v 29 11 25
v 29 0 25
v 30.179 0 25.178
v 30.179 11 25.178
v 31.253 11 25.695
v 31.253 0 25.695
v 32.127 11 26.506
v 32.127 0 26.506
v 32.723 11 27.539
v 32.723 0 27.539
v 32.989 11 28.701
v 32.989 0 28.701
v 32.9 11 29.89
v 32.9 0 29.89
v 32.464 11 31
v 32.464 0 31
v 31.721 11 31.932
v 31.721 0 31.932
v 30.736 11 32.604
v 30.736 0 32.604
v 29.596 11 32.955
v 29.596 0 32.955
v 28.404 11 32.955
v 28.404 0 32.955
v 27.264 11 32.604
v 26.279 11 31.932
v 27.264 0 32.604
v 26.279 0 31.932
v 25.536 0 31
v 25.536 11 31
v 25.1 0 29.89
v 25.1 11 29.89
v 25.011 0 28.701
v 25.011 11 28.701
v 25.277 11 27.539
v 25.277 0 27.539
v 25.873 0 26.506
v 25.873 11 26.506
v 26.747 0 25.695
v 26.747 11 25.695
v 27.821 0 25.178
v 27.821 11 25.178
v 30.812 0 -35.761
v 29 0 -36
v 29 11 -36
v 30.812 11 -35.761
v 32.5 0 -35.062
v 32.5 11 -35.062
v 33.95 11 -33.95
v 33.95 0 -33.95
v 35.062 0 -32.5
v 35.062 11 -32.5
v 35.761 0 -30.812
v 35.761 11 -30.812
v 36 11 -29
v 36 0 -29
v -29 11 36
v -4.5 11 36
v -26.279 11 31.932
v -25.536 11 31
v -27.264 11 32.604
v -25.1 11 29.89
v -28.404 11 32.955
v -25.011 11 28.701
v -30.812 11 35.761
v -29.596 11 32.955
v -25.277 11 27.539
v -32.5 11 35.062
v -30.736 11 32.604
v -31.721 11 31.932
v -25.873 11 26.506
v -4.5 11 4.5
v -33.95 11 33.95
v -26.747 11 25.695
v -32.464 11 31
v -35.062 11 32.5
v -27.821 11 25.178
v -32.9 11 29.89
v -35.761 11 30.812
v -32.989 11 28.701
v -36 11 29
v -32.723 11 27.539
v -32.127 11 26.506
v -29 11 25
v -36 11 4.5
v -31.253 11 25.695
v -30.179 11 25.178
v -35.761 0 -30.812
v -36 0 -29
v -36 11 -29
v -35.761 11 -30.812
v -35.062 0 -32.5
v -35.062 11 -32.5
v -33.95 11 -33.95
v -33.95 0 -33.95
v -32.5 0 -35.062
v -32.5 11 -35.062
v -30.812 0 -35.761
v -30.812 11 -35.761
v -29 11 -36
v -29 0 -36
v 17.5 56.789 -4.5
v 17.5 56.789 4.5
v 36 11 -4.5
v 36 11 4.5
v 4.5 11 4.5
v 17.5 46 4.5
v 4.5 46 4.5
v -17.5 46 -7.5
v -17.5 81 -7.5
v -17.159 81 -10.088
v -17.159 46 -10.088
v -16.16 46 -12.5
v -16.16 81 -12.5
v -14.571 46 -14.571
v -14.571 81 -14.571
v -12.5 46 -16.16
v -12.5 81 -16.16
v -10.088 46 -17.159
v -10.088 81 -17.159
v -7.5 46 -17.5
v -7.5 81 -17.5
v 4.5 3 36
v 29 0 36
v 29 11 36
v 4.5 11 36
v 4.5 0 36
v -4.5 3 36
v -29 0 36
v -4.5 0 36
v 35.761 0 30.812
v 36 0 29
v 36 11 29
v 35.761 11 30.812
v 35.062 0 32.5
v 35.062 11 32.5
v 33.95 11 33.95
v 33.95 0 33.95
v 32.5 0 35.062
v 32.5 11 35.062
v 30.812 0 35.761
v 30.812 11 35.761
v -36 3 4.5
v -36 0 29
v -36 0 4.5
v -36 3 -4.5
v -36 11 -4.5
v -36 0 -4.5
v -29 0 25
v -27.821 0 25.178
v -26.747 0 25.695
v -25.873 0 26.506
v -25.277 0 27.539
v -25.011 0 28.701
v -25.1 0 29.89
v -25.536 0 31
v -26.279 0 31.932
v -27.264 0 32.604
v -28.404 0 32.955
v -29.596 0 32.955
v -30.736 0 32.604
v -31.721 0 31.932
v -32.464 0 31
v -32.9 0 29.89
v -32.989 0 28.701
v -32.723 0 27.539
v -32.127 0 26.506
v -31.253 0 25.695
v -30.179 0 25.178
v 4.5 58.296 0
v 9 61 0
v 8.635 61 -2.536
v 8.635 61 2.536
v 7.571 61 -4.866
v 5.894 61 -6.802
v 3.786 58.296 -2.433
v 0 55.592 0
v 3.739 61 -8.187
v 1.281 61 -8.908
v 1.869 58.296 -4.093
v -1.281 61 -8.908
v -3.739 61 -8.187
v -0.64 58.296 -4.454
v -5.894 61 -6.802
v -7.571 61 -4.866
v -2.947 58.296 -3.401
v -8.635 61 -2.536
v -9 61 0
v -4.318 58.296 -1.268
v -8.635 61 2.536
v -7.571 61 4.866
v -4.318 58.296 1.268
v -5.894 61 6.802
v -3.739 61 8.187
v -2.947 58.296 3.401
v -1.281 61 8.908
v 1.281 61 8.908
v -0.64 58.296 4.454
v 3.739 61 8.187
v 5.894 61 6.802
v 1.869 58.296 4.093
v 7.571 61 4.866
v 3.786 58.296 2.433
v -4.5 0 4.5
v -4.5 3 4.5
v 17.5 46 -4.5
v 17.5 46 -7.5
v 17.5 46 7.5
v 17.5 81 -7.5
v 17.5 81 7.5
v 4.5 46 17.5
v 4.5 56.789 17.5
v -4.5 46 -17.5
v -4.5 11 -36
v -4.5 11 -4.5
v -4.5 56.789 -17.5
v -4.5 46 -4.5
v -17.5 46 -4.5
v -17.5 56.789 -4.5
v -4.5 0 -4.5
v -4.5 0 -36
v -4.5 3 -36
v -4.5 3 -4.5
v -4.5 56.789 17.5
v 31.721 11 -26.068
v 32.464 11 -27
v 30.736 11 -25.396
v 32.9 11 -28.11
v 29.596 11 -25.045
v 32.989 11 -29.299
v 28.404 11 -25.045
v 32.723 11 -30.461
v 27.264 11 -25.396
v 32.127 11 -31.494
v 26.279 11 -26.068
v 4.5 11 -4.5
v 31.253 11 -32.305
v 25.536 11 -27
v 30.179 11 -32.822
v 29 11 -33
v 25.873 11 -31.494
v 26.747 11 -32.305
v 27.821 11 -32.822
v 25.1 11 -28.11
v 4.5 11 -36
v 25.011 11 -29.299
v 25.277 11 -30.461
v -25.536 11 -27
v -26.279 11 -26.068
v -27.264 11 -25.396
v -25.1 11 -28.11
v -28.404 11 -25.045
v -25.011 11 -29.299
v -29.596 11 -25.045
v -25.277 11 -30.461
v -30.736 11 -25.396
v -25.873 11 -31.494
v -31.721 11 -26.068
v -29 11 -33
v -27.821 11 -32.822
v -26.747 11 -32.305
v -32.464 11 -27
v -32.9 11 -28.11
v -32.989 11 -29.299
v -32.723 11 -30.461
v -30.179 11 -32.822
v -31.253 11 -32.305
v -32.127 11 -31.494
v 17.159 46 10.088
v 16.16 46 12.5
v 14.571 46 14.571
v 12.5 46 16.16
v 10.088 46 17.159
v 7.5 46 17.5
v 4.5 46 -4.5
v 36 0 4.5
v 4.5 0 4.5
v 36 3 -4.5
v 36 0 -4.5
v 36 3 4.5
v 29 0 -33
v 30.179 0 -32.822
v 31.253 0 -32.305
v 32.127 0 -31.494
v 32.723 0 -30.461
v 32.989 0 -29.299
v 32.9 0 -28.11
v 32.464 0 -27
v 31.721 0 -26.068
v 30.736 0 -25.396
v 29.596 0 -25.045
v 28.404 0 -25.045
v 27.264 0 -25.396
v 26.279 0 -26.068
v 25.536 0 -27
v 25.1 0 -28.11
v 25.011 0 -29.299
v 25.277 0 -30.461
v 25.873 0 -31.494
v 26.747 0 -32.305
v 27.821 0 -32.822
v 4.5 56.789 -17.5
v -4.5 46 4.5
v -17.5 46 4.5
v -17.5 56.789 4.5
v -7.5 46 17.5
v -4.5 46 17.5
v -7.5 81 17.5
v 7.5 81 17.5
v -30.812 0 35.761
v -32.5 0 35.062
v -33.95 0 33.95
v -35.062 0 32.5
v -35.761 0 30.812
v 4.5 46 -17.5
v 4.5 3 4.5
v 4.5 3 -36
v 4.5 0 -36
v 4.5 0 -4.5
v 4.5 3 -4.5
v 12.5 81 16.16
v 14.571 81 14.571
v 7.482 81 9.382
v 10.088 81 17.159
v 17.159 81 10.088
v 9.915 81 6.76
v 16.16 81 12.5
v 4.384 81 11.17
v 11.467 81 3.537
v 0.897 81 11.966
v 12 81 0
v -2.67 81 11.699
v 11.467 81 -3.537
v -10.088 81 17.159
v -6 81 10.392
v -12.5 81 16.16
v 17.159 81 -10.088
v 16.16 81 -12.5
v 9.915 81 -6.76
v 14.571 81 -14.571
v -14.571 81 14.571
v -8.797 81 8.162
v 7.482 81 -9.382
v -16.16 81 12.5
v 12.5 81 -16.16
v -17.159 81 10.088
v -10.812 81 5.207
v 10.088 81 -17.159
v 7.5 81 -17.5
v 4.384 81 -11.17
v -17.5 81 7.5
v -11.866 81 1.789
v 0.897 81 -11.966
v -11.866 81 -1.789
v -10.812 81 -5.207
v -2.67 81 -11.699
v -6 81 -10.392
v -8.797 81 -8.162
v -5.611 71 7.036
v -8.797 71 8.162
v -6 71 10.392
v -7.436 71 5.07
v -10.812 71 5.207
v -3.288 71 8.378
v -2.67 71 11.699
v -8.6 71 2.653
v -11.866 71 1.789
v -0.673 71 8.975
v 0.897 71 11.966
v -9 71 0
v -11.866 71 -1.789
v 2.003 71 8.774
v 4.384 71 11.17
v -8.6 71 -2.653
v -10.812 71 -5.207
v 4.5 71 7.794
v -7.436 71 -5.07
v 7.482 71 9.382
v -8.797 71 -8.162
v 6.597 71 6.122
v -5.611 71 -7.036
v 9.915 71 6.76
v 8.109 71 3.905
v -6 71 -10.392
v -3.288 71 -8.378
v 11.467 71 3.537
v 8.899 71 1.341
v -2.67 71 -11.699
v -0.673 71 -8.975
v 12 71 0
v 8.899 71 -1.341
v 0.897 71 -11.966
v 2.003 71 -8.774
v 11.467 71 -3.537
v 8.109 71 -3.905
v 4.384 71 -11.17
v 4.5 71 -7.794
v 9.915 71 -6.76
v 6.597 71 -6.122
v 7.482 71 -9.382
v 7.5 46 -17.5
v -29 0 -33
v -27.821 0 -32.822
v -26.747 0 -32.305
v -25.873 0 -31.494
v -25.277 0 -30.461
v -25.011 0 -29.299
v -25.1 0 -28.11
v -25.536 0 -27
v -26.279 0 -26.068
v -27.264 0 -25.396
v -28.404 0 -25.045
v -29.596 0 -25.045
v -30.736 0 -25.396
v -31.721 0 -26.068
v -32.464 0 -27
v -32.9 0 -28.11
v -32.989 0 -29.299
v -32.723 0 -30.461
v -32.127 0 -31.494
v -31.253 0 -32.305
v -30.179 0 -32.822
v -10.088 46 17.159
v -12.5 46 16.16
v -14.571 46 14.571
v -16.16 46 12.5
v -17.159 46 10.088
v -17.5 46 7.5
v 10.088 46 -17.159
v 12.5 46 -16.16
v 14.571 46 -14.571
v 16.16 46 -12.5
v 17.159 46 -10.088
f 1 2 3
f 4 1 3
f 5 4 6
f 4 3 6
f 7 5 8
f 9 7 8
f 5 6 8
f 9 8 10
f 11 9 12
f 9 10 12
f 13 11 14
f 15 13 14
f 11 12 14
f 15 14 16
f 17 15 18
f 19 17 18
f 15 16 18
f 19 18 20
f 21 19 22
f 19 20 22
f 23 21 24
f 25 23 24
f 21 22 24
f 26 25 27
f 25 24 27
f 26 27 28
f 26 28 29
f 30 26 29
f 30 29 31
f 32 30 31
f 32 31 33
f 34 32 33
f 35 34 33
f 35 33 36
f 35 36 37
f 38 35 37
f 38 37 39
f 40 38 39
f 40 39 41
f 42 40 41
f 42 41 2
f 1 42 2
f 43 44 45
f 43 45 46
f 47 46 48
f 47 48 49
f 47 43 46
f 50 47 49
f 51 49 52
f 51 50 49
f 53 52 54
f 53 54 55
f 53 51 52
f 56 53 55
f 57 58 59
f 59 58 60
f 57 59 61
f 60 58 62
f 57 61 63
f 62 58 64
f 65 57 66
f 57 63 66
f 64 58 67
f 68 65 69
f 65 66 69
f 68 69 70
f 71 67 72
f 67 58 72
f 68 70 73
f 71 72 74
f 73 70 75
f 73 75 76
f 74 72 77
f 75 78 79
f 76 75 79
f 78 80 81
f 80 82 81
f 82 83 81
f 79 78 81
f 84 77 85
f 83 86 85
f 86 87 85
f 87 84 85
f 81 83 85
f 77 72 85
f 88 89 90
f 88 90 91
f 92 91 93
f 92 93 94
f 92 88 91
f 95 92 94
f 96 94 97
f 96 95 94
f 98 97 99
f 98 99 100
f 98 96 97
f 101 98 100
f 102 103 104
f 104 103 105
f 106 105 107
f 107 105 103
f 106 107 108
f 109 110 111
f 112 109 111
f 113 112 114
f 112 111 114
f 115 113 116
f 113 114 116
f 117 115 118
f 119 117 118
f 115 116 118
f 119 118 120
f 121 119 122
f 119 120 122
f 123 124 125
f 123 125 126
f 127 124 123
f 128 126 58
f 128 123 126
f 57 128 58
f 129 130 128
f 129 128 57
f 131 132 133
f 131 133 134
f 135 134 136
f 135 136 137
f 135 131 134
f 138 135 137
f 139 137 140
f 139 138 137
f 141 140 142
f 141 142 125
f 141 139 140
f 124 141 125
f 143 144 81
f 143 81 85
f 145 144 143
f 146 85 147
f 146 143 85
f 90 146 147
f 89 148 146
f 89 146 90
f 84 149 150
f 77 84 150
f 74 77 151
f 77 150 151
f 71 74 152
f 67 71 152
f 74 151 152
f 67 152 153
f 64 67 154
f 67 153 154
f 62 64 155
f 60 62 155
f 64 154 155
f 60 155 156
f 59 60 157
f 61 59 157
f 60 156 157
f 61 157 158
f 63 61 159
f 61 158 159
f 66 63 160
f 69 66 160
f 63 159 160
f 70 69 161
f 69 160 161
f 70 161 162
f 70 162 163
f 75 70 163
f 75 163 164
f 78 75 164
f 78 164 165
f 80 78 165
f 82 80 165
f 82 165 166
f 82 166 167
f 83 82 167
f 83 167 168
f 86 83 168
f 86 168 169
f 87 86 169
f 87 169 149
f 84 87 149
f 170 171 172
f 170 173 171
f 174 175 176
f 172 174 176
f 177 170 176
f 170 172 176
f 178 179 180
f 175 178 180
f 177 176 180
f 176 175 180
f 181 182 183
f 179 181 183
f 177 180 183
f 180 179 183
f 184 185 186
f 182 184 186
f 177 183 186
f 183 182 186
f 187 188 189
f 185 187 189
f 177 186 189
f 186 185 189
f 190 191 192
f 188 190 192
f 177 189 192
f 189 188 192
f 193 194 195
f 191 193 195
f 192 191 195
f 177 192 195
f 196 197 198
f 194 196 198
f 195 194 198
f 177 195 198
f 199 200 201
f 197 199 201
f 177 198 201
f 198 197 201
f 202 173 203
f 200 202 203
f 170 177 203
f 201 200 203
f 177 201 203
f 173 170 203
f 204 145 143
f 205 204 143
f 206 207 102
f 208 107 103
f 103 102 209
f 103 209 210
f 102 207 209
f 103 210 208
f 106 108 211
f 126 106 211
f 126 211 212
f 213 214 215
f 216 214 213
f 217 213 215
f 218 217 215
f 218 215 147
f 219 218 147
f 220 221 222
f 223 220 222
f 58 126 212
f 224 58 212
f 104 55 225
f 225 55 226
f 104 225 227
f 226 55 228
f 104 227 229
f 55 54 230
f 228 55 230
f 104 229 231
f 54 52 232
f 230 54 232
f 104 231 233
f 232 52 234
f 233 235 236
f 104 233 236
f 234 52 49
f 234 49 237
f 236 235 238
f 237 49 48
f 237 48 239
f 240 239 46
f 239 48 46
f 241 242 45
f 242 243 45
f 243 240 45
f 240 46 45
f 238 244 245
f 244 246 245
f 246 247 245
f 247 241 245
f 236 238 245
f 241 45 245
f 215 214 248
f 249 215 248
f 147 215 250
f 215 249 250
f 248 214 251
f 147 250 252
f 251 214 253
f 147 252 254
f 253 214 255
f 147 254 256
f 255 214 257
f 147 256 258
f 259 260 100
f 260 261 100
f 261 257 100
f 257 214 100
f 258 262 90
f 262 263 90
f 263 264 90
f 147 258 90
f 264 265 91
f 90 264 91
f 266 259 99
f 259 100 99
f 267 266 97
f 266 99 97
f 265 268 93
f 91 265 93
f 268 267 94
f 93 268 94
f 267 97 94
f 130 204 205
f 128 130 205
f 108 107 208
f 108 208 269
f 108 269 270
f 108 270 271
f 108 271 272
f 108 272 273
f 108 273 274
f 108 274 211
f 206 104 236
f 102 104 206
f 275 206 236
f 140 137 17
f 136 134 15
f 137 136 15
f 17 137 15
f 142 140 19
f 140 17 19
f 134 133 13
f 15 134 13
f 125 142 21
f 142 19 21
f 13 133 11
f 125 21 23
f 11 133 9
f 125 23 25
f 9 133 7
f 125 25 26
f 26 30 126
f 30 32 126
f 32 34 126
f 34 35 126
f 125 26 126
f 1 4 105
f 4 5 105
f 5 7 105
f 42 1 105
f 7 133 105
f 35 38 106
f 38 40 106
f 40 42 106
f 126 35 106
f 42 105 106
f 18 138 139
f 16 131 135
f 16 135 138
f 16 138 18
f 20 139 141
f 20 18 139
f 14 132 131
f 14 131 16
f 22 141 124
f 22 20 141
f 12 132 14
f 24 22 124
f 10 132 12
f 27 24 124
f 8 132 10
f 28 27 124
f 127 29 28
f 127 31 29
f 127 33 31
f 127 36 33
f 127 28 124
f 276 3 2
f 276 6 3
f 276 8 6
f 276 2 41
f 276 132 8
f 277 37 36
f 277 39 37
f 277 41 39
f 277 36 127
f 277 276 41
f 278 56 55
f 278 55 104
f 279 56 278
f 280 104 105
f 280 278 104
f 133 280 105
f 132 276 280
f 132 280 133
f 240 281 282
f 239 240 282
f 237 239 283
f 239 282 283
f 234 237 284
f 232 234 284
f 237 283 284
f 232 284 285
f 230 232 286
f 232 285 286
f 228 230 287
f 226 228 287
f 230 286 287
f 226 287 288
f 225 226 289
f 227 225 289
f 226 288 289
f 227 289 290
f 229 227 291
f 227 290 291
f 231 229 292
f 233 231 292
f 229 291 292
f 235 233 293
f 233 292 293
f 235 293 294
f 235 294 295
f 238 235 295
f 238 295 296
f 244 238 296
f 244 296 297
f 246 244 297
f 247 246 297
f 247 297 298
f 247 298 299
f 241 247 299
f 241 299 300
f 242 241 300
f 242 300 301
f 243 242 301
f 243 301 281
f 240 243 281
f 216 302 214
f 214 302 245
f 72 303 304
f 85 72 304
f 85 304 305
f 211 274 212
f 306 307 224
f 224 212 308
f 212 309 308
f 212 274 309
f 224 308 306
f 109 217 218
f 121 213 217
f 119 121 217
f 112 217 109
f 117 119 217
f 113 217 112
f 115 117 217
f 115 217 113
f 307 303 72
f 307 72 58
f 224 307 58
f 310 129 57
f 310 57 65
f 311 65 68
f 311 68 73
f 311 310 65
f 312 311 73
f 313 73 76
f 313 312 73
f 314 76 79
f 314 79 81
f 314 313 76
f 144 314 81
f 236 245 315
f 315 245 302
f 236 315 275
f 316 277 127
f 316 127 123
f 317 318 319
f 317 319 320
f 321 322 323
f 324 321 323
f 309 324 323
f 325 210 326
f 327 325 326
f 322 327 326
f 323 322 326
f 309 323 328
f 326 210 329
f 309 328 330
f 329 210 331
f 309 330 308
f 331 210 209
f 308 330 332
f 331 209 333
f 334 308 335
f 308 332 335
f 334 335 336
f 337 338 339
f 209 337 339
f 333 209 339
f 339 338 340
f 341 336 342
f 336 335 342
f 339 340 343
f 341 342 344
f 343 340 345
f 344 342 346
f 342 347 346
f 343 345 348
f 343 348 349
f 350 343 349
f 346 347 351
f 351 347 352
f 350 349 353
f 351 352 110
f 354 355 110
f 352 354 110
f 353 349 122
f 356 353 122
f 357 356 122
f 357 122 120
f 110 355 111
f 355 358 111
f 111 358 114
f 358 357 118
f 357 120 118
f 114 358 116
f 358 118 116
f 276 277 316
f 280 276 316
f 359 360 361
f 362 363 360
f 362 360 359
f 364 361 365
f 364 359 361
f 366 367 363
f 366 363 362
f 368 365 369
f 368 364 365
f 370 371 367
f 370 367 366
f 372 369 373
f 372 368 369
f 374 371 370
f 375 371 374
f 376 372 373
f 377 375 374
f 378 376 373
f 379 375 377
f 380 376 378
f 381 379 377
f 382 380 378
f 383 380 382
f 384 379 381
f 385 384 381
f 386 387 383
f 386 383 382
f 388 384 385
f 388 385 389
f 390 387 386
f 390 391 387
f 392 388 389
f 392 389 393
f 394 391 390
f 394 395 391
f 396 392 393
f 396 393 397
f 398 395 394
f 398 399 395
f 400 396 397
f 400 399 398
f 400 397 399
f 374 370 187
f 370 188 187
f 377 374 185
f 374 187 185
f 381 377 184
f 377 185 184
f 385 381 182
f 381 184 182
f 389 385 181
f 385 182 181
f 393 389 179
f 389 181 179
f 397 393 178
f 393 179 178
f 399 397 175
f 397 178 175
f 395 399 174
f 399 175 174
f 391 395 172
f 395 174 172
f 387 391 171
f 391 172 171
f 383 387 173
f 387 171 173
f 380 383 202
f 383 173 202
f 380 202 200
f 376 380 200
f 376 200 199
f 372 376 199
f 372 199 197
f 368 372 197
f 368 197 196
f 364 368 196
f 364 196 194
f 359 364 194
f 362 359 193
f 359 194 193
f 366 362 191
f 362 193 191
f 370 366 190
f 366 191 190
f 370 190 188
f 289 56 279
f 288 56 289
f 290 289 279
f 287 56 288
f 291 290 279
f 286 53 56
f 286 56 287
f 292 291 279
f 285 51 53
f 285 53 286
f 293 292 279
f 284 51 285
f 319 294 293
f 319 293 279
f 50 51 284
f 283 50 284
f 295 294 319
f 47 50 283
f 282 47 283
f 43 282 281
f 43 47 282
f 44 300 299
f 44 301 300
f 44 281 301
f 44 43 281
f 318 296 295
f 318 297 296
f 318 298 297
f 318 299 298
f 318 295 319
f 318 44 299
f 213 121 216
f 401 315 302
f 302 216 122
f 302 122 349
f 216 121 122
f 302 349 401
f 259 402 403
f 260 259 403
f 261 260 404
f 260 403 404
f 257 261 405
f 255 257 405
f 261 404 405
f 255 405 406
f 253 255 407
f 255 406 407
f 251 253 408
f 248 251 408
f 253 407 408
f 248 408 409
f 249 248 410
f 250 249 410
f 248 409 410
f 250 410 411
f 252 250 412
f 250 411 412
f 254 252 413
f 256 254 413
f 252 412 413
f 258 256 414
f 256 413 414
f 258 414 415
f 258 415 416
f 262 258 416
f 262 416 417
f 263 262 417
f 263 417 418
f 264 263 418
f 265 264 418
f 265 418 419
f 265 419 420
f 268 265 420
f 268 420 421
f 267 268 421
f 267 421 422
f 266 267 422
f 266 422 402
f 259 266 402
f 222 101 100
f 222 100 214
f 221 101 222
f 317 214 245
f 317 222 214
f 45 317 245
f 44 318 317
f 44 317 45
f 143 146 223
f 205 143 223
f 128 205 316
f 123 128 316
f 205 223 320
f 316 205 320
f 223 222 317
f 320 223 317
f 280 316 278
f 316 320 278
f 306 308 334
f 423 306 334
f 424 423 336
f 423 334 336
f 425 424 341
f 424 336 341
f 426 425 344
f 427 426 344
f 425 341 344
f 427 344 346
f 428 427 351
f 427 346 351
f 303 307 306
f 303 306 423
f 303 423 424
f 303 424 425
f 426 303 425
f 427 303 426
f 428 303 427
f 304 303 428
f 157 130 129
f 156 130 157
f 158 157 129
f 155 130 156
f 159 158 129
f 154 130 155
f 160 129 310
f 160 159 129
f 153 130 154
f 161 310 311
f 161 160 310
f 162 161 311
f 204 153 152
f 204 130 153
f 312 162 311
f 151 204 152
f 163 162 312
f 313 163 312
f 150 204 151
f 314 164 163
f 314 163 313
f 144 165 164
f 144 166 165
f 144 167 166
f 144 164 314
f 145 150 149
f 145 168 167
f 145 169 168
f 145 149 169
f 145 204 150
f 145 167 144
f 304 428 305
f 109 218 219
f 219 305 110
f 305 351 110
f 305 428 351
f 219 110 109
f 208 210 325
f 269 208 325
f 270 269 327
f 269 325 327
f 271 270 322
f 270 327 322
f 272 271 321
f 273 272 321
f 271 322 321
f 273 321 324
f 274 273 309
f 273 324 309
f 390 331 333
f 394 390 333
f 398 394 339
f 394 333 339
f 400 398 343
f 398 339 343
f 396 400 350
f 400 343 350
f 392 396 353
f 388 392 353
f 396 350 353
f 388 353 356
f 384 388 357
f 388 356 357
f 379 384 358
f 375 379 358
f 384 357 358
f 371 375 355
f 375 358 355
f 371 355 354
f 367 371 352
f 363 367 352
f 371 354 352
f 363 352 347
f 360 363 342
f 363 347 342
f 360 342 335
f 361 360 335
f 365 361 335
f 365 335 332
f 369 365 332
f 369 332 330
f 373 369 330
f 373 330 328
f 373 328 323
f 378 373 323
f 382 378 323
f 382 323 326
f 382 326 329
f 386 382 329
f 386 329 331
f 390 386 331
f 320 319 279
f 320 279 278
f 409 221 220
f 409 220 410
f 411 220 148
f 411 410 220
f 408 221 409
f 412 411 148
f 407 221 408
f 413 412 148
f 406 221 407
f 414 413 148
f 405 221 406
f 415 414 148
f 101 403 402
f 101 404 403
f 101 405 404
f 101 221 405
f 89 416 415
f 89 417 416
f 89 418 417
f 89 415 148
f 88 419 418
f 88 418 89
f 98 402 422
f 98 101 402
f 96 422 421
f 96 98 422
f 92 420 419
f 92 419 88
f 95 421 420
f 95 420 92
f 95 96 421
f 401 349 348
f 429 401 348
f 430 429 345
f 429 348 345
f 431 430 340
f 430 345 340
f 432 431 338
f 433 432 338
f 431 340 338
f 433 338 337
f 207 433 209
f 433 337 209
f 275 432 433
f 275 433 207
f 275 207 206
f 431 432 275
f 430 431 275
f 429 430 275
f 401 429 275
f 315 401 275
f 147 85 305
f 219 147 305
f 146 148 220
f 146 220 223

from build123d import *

# Parameters (mm, degrees)
EXTRUDE_1_DEPTH              = 11
EXTRUDE_2_DEPTH              = 4.5
EXTRUDE_3_DEPTH              = 4.5
EXTRUDE_4_DEPTH              = 35
HOLE_WIZARD_M4_1_D           = 18
HOLE_WIZARD_M4_1_DEPTH       = 20
HOLE_WIZARD_M4_1_CBORE_D     = 24
HOLE_WIZARD_M4_1_CBORE_DEPTH = 10
HOLE_WIZARD_M4_1_TIP         = 5.407745571
SKETCH_14_R                  = 4
CUT_EXTRUDE_1_DEPTH          = 15
CUT_EXTRUDE_2_DEPTH          = 96.671312315
CUT_EXTRUDE_2_DEPTH_BACK     = 96.671312315
SKETCH_15_W                  = 9
SKETCH_15_H                  = 3
CUT_EXTRUDE_3_DEPTH          = 96.671312315
CUT_EXTRUDE_3_DEPTH_BACK     = 96.671312315
SKETCH_16_W                  = 9
SKETCH_16_H                  = 3


with BuildPart() as part:
    # 스케치1 → 보스-돌출1 (new body)
    with BuildSketch(Plane(origin=(0, 0, 0), x_dir=(1, 0, 0), z_dir=(0, 1, 0))):
        with BuildLine():
            Line((-29, 36), (29, 36))
            ThreePointArc((29, 36), (33.949747468, 33.949747468), (36, 29))
            Line((36, 29), (36, -29))
            ThreePointArc((36, -29), (33.949747468, -33.949747468), (29, -36))
            Line((29, -36), (-29, -36))
            ThreePointArc((-29, -36), (-33.949747468, -33.949747468), (-36, -29))
            Line((-36, -29), (-36, 29))
            ThreePointArc((-36, 29), (-33.949747468, 33.949747468), (-29, 36))
        make_face()
    extrude(amount=EXTRUDE_1_DEPTH)

    # 스케치2 → 보스-돌출2 (add, symmetric)
    with BuildSketch(Plane.XY):
        Polygon((-36, 11), (-13.651164073, 66.315309992), (13.651164073, 66.315309992), (36, 11), align=None)
    extrude(amount=EXTRUDE_2_DEPTH, both=True)

    # 스케치3 → 보스-돌출3 (add, symmetric)
    with BuildSketch(Plane(origin=(0, 0, 0), x_dir=(0, 0, -1), z_dir=(1, 0, 0))):
        Polygon((-36, 11), (-13.651164073, 66.315309992), (13.651164073, 66.315309992), (36, 11), align=None)
    extrude(amount=EXTRUDE_3_DEPTH, both=True)

    # 스케치4 → 보스-돌출4 (add)
    with BuildSketch(Plane(origin=(0, 81, 0), x_dir=(1, 0, 0), z_dir=(0, 1, 0))):
        with BuildLine():
            Line((-7.5, 17.5), (7.5, 17.5))
            ThreePointArc((7.5, 17.5), (14.571067812, 14.571067812), (17.5, 7.5))
            Line((17.5, 7.5), (17.5, -7.5))
            ThreePointArc((17.5, -7.5), (14.571067812, -14.571067812), (7.5, -17.5))
            Line((7.5, -17.5), (-7.5, -17.5))
            ThreePointArc((-7.5, -17.5), (-14.571067812, -14.571067812), (-17.5, -7.5))
            Line((-17.5, -7.5), (-17.5, 7.5))
            ThreePointArc((-17.5, 7.5), (-14.571067812, 14.571067812), (-7.5, 17.5))
        make_face()
    extrude(amount=-EXTRUDE_4_DEPTH)

    # M4 소켓 머리 캡 나사용 카운터보어1
    with Locations(Plane(origin=(0, 81, 0), x_dir=(1, 0, 0), z_dir=(0, 1, 0))):
        with Locations((0, 0)):
            CounterBoreHole(HOLE_WIZARD_M4_1_D / 2, HOLE_WIZARD_M4_1_CBORE_D / 2, HOLE_WIZARD_M4_1_CBORE_DEPTH, depth=HOLE_WIZARD_M4_1_DEPTH)
            with Locations((0, 0, -(HOLE_WIZARD_M4_1_DEPTH + HOLE_WIZARD_M4_1_TIP / 2))):  # 118° drill point
                Cone(0, HOLE_WIZARD_M4_1_D / 2, HOLE_WIZARD_M4_1_TIP, mode=Mode.SUBTRACT)

    # 스케치14 → 컷-돌출1 (cut)
    with BuildSketch(Plane.XZ):
        with Locations(Location((-29, 29, 0), (0, 0, 270))):
            Circle(SKETCH_14_R)
        with Locations(Location((29, 29, 0), (0, 0, 270))):
            Circle(SKETCH_14_R)
        with Locations(Location((-29, -29, 0), (0, 0, 270))):
            Circle(SKETCH_14_R)
        with Locations(Location((29, -29, 0), (0, 0, 270))):
            Circle(SKETCH_14_R)
    extrude(amount=-CUT_EXTRUDE_1_DEPTH, mode=Mode.SUBTRACT)

    # 스케치15 → 컷-돌출2 (cut, two sides: drawn at the far end of the back side and taken through both)
    with BuildSketch(Plane(origin=(0, 0, 0), x_dir=(0, 0, -1), z_dir=(1, 0, 0)).offset(-CUT_EXTRUDE_2_DEPTH_BACK)):
        with Locations((0, 1.5)):
            Rectangle(SKETCH_15_W, SKETCH_15_H)
    extrude(amount=CUT_EXTRUDE_2_DEPTH + CUT_EXTRUDE_2_DEPTH_BACK, mode=Mode.SUBTRACT)

    # 스케치16 → 컷-돌출3 (cut, two sides: drawn at the far end of the back side and taken through both)
    with BuildSketch(Plane.XY.offset(-CUT_EXTRUDE_3_DEPTH_BACK)):
        with Locations((0, 1.5)):
            Rectangle(SKETCH_16_W, SKETCH_16_H)
    extrude(amount=CUT_EXTRUDE_3_DEPTH + CUT_EXTRUDE_3_DEPTH_BACK, mode=Mode.SUBTRACT)


solid = part.part
